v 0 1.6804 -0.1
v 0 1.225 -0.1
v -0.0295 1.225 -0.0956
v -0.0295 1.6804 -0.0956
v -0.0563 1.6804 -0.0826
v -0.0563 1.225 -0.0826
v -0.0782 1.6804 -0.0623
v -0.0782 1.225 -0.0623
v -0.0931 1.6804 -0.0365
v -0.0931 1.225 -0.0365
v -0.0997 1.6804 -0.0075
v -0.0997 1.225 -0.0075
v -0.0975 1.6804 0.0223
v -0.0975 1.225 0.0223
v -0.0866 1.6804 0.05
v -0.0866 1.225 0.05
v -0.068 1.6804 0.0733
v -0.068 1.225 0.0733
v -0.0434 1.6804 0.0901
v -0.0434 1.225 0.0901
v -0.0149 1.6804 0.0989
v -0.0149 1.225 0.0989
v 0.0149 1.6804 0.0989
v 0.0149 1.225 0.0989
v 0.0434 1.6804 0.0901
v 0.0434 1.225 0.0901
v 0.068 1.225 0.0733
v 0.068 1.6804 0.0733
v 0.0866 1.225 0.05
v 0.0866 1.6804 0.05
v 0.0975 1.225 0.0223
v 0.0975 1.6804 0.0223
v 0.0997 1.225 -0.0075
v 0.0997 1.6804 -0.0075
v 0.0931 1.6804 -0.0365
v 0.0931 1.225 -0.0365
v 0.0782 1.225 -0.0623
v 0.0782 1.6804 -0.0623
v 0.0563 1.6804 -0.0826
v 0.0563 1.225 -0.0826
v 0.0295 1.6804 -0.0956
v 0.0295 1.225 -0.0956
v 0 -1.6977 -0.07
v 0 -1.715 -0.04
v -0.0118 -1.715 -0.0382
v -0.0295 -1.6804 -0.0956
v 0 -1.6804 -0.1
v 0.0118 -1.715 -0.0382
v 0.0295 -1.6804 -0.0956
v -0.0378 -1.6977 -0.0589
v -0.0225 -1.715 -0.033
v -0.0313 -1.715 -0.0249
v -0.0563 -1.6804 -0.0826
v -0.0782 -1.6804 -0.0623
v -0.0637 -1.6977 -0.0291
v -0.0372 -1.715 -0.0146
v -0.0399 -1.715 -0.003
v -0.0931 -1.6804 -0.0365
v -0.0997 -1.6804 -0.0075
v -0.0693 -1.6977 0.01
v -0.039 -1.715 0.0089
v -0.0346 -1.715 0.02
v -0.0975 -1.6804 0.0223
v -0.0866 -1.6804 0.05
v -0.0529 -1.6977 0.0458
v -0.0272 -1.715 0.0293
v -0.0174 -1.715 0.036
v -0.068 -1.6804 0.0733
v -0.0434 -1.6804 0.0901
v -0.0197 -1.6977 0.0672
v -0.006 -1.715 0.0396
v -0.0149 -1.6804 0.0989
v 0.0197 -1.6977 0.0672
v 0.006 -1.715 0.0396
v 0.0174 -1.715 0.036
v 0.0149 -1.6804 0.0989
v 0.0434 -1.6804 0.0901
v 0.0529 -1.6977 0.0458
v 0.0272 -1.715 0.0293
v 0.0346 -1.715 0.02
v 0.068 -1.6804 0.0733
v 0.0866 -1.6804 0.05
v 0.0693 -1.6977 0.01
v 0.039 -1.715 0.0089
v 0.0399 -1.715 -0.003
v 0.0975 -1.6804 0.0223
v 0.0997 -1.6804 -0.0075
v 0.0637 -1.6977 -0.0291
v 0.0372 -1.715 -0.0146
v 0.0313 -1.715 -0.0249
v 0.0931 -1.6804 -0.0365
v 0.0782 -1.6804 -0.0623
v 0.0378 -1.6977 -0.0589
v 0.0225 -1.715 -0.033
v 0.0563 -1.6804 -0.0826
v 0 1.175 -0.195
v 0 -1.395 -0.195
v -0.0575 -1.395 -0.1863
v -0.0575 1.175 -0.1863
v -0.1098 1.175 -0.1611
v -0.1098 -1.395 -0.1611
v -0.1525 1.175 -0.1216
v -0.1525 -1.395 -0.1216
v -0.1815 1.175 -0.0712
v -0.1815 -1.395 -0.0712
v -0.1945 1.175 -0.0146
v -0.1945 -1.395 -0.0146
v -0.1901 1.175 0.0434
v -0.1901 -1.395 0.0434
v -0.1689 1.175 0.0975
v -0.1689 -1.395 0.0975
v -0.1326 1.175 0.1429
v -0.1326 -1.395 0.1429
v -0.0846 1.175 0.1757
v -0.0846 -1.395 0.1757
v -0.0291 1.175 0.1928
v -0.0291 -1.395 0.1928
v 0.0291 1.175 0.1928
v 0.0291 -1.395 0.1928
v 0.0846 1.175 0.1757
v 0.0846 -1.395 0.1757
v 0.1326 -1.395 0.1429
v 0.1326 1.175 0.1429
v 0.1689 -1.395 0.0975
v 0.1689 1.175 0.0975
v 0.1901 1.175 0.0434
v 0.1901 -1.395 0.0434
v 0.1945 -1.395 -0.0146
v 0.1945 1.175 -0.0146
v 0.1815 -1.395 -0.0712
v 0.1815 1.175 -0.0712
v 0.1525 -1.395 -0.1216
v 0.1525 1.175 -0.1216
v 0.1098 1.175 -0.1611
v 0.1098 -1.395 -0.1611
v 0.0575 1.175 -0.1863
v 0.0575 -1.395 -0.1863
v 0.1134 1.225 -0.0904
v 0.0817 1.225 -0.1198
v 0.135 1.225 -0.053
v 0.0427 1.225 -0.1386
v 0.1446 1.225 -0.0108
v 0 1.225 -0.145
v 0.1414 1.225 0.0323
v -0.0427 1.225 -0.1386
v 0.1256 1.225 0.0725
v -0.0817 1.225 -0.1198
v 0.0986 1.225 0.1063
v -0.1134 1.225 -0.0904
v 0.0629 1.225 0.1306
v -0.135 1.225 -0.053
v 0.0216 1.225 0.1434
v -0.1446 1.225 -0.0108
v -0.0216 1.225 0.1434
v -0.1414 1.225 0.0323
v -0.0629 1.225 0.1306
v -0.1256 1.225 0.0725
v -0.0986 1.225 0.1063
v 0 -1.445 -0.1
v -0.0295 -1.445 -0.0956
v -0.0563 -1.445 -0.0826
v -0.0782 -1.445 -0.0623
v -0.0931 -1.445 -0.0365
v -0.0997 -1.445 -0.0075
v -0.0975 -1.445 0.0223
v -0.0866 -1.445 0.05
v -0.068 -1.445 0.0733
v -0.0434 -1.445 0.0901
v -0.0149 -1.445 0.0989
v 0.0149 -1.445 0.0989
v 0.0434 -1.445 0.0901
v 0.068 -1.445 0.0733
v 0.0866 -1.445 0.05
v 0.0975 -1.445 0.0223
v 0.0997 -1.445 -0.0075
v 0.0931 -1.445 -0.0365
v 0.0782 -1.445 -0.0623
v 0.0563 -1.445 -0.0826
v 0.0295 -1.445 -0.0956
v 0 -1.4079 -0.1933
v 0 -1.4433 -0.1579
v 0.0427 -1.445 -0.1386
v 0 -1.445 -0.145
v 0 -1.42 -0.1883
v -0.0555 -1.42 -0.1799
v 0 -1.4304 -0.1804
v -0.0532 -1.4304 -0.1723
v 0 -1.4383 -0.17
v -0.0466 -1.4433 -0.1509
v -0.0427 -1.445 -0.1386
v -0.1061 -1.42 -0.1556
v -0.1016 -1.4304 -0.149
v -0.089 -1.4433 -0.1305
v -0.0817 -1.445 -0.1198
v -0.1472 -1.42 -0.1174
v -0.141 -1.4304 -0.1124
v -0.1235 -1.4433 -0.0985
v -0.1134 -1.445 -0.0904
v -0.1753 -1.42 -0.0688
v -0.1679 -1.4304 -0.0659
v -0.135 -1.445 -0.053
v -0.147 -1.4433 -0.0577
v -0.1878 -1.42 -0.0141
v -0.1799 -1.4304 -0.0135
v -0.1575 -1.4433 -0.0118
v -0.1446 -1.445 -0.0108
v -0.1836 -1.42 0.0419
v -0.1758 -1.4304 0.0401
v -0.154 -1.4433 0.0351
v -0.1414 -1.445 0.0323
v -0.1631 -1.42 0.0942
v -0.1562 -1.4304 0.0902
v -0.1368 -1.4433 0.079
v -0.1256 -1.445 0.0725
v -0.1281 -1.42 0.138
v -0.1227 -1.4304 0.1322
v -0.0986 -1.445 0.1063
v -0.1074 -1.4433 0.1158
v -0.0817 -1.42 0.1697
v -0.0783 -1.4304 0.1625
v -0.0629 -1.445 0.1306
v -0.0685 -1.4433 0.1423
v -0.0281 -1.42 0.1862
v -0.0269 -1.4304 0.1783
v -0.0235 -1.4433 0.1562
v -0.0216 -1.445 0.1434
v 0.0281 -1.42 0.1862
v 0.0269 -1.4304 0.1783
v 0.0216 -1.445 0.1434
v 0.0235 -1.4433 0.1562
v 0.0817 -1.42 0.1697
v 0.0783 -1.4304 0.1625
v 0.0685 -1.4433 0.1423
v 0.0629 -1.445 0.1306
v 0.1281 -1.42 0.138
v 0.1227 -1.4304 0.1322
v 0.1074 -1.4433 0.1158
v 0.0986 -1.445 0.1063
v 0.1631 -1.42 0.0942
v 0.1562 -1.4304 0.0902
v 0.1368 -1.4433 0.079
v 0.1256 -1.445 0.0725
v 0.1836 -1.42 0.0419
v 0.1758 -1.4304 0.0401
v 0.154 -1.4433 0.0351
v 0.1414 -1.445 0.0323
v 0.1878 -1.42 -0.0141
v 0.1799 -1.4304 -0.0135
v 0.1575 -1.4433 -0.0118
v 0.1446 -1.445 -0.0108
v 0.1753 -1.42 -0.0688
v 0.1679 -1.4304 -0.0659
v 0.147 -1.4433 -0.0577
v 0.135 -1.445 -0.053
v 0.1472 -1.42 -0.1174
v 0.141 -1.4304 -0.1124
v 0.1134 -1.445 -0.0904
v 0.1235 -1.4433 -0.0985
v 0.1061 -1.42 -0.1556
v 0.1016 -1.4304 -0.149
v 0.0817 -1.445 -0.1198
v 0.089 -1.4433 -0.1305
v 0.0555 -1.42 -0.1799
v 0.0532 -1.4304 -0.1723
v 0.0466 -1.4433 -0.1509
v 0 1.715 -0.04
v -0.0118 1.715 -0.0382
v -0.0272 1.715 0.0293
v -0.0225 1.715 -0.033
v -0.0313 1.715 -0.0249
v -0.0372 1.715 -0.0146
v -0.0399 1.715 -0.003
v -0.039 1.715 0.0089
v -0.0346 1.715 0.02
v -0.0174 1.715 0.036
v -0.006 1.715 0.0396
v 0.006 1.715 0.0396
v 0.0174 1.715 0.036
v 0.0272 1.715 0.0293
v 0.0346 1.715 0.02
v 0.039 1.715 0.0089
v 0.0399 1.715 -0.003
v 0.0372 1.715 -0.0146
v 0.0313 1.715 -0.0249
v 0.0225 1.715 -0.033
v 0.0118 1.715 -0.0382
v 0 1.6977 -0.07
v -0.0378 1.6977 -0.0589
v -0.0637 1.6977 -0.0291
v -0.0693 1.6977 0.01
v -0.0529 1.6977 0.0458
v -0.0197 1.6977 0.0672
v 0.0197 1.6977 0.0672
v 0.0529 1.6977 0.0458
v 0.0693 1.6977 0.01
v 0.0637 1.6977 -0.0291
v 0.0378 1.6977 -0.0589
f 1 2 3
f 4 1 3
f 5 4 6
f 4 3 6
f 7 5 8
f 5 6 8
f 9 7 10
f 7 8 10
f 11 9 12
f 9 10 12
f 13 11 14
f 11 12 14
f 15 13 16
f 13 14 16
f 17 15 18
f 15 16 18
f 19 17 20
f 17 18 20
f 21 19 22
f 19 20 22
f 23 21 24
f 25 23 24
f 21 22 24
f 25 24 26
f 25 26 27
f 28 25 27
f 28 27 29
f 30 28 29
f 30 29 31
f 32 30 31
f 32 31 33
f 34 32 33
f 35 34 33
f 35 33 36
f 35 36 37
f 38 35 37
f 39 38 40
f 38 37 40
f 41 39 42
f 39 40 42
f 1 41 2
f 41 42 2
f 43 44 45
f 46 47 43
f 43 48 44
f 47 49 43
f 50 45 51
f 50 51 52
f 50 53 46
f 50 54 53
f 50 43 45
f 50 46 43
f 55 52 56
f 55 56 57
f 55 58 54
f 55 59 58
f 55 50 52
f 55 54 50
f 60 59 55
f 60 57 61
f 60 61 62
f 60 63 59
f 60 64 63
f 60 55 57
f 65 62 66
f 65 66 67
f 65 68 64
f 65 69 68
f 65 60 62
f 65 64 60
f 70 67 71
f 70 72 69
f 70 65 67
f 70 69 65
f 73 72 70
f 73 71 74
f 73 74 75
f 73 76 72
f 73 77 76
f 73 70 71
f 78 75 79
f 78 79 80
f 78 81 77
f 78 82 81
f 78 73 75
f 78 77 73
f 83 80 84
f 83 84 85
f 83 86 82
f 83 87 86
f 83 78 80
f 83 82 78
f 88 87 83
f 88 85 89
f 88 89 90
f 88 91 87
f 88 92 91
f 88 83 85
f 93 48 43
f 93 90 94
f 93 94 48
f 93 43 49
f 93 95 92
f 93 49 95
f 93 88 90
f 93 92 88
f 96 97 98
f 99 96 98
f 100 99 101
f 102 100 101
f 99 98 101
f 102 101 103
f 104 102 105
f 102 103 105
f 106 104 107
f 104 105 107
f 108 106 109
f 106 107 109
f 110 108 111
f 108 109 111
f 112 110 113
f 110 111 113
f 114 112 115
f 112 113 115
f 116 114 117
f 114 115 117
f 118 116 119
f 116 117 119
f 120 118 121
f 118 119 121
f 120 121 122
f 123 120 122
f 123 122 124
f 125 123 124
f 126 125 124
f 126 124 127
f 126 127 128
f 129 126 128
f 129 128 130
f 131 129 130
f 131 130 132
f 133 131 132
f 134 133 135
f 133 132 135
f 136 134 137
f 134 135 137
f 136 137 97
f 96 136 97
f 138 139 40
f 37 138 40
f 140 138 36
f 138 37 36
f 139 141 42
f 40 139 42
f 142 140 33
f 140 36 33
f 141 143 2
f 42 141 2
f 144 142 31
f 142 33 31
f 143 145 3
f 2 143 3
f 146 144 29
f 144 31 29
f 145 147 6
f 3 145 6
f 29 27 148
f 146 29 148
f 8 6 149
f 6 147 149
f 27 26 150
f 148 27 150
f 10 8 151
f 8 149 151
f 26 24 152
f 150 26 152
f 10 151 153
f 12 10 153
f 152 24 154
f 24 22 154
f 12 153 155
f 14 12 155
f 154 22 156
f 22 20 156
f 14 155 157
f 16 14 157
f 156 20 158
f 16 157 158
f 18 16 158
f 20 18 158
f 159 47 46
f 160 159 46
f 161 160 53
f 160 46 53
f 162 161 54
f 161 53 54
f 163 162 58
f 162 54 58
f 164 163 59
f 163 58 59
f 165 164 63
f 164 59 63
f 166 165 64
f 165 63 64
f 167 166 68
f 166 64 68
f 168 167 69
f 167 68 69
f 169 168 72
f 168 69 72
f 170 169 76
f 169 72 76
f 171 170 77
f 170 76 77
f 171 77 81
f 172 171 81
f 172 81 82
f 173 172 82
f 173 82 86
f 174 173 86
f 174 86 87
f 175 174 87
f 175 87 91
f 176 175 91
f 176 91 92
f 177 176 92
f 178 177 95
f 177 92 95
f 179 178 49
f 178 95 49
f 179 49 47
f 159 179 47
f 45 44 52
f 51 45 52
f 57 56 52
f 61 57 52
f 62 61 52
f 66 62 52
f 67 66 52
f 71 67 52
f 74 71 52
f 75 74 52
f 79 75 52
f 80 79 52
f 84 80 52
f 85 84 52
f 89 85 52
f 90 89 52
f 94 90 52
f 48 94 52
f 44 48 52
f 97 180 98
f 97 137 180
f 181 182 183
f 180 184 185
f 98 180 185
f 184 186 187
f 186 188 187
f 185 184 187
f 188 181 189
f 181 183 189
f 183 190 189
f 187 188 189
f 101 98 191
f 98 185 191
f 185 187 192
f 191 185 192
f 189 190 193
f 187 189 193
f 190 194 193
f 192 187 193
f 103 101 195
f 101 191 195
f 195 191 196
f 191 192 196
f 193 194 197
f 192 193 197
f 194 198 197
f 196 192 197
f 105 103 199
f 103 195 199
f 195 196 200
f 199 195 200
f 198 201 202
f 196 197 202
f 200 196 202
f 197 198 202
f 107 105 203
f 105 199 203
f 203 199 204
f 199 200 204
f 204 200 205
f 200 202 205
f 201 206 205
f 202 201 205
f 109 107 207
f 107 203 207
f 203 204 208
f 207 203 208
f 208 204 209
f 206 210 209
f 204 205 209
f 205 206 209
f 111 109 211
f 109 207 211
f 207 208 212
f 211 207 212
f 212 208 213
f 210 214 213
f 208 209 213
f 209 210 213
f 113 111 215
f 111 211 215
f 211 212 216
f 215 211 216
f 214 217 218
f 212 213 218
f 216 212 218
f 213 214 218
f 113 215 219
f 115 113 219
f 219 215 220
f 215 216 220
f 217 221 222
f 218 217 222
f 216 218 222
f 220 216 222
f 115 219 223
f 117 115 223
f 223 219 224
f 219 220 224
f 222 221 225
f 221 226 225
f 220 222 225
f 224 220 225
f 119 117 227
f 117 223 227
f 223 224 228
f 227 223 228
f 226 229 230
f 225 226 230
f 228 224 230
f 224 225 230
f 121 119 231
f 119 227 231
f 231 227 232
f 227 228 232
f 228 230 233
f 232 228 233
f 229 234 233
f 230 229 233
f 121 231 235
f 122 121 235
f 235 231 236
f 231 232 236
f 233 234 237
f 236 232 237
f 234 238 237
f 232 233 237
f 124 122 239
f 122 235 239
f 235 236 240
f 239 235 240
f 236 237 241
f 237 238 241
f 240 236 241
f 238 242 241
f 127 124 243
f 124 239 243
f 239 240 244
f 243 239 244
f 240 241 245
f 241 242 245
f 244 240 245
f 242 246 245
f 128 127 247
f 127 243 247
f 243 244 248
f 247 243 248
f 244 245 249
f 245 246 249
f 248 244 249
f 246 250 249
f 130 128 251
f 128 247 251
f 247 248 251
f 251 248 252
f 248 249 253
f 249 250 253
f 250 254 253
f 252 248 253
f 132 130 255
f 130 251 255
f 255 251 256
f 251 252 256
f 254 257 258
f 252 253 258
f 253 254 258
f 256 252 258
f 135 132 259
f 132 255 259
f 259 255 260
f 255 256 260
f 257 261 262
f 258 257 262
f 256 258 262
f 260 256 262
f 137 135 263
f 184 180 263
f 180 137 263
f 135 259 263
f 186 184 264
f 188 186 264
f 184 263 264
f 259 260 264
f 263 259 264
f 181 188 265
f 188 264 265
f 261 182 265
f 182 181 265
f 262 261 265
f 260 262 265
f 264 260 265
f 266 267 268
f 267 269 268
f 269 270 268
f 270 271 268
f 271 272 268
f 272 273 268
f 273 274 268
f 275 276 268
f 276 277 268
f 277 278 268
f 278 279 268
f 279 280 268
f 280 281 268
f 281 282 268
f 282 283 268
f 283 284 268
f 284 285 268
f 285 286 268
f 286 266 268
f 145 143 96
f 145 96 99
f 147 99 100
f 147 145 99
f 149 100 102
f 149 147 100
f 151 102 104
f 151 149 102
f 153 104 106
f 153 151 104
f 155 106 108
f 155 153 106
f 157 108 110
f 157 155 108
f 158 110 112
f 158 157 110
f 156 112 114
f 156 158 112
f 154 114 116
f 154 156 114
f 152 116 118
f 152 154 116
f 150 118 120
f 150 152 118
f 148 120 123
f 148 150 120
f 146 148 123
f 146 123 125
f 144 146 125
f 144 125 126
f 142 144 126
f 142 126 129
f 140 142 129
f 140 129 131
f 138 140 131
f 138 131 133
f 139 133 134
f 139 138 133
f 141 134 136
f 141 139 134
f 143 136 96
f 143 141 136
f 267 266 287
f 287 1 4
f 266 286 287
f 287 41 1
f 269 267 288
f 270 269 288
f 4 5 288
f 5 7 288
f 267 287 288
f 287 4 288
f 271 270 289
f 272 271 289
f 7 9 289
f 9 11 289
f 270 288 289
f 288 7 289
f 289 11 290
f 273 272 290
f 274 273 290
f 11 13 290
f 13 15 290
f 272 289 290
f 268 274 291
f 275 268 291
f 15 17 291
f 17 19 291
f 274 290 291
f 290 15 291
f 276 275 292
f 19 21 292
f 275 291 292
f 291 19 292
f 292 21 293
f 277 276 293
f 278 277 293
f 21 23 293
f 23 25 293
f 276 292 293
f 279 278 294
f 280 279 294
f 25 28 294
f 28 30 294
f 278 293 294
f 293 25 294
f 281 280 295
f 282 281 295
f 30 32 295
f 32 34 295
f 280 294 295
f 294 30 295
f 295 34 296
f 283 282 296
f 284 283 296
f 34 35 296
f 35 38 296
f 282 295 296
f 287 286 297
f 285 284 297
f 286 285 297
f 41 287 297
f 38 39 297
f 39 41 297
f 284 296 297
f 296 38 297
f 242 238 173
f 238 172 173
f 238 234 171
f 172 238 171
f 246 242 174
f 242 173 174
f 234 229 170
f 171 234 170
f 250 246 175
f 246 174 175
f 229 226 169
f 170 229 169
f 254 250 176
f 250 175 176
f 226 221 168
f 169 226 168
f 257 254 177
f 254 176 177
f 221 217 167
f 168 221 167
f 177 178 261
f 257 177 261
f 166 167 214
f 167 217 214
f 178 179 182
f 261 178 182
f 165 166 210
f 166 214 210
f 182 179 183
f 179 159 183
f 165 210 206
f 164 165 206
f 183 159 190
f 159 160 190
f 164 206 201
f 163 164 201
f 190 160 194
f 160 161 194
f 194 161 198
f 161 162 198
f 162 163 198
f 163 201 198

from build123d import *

# Parameters (mm, degrees)
CHAMFER1_SIZE  = 0.06
CHAMFER1_SIZE2 = 0.034641016
CHAMFER2_SIZE  = 0.06
CHAMFER2_SIZE2 = 0.034641016
CHAMFER3_SIZE  = 0.05
FILLET1_R      = 0.05


with BuildPart() as part:
    # Sketch1 → Revolve1 (revolve)
    with BuildSketch(Plane.XY, mode=Mode.PRIVATE) as revolve1_sk:
        Polygon((0, 1.715), (0.1, 1.715), (0.1, 1.225), (0.195, 1.225), (0.195, -1.445), (0.1, -1.445), (0.1, -1.715), (0, -1.715), align=None)
    revolve(revolve1_sk.sketch.rotate(Axis((0, -1.057499082, 0), (0, 1, 0)), 90), axis=Axis((0, -1.057499082, 0), (0, 1, 0)))

    # Chamfer1
    chamfer1_edges = [part.edges().sort_by_distance(p)[0] for p in [
        (0, 1.715, 0.1),
    ]]
    chamfer1_side = [part.faces().sort_by_distance(p)[0] for p in [
        (0, 1.715, 0),
    ]]
    chamfer(chamfer1_edges, length=CHAMFER1_SIZE, length2=CHAMFER1_SIZE2, reference=chamfer1_side[0])

    # Chamfer2
    chamfer2_edges = [part.edges().sort_by_distance(p)[0] for p in [
        (0, -1.715, 0.1),
    ]]
    chamfer2_side = [part.faces().sort_by_distance(p)[0] for p in [
        (0, -1.715, 0),
    ]]
    chamfer(chamfer2_edges, length=CHAMFER2_SIZE, length2=CHAMFER2_SIZE2, reference=chamfer2_side[0])

    # Chamfer3
    chamfer3_edges = [part.edges().sort_by_distance(p)[0] for p in [
        (0, 1.225, 0.195),
    ]]
    chamfer(chamfer3_edges, length=CHAMFER3_SIZE)

    # Fillet1
    fillet1_edges = [part.edges().sort_by_distance(p)[0] for p in [
        (0, -1.445, 0.195),
    ]]
    fillet(fillet1_edges, radius=FILLET1_R)


solid = part.part
